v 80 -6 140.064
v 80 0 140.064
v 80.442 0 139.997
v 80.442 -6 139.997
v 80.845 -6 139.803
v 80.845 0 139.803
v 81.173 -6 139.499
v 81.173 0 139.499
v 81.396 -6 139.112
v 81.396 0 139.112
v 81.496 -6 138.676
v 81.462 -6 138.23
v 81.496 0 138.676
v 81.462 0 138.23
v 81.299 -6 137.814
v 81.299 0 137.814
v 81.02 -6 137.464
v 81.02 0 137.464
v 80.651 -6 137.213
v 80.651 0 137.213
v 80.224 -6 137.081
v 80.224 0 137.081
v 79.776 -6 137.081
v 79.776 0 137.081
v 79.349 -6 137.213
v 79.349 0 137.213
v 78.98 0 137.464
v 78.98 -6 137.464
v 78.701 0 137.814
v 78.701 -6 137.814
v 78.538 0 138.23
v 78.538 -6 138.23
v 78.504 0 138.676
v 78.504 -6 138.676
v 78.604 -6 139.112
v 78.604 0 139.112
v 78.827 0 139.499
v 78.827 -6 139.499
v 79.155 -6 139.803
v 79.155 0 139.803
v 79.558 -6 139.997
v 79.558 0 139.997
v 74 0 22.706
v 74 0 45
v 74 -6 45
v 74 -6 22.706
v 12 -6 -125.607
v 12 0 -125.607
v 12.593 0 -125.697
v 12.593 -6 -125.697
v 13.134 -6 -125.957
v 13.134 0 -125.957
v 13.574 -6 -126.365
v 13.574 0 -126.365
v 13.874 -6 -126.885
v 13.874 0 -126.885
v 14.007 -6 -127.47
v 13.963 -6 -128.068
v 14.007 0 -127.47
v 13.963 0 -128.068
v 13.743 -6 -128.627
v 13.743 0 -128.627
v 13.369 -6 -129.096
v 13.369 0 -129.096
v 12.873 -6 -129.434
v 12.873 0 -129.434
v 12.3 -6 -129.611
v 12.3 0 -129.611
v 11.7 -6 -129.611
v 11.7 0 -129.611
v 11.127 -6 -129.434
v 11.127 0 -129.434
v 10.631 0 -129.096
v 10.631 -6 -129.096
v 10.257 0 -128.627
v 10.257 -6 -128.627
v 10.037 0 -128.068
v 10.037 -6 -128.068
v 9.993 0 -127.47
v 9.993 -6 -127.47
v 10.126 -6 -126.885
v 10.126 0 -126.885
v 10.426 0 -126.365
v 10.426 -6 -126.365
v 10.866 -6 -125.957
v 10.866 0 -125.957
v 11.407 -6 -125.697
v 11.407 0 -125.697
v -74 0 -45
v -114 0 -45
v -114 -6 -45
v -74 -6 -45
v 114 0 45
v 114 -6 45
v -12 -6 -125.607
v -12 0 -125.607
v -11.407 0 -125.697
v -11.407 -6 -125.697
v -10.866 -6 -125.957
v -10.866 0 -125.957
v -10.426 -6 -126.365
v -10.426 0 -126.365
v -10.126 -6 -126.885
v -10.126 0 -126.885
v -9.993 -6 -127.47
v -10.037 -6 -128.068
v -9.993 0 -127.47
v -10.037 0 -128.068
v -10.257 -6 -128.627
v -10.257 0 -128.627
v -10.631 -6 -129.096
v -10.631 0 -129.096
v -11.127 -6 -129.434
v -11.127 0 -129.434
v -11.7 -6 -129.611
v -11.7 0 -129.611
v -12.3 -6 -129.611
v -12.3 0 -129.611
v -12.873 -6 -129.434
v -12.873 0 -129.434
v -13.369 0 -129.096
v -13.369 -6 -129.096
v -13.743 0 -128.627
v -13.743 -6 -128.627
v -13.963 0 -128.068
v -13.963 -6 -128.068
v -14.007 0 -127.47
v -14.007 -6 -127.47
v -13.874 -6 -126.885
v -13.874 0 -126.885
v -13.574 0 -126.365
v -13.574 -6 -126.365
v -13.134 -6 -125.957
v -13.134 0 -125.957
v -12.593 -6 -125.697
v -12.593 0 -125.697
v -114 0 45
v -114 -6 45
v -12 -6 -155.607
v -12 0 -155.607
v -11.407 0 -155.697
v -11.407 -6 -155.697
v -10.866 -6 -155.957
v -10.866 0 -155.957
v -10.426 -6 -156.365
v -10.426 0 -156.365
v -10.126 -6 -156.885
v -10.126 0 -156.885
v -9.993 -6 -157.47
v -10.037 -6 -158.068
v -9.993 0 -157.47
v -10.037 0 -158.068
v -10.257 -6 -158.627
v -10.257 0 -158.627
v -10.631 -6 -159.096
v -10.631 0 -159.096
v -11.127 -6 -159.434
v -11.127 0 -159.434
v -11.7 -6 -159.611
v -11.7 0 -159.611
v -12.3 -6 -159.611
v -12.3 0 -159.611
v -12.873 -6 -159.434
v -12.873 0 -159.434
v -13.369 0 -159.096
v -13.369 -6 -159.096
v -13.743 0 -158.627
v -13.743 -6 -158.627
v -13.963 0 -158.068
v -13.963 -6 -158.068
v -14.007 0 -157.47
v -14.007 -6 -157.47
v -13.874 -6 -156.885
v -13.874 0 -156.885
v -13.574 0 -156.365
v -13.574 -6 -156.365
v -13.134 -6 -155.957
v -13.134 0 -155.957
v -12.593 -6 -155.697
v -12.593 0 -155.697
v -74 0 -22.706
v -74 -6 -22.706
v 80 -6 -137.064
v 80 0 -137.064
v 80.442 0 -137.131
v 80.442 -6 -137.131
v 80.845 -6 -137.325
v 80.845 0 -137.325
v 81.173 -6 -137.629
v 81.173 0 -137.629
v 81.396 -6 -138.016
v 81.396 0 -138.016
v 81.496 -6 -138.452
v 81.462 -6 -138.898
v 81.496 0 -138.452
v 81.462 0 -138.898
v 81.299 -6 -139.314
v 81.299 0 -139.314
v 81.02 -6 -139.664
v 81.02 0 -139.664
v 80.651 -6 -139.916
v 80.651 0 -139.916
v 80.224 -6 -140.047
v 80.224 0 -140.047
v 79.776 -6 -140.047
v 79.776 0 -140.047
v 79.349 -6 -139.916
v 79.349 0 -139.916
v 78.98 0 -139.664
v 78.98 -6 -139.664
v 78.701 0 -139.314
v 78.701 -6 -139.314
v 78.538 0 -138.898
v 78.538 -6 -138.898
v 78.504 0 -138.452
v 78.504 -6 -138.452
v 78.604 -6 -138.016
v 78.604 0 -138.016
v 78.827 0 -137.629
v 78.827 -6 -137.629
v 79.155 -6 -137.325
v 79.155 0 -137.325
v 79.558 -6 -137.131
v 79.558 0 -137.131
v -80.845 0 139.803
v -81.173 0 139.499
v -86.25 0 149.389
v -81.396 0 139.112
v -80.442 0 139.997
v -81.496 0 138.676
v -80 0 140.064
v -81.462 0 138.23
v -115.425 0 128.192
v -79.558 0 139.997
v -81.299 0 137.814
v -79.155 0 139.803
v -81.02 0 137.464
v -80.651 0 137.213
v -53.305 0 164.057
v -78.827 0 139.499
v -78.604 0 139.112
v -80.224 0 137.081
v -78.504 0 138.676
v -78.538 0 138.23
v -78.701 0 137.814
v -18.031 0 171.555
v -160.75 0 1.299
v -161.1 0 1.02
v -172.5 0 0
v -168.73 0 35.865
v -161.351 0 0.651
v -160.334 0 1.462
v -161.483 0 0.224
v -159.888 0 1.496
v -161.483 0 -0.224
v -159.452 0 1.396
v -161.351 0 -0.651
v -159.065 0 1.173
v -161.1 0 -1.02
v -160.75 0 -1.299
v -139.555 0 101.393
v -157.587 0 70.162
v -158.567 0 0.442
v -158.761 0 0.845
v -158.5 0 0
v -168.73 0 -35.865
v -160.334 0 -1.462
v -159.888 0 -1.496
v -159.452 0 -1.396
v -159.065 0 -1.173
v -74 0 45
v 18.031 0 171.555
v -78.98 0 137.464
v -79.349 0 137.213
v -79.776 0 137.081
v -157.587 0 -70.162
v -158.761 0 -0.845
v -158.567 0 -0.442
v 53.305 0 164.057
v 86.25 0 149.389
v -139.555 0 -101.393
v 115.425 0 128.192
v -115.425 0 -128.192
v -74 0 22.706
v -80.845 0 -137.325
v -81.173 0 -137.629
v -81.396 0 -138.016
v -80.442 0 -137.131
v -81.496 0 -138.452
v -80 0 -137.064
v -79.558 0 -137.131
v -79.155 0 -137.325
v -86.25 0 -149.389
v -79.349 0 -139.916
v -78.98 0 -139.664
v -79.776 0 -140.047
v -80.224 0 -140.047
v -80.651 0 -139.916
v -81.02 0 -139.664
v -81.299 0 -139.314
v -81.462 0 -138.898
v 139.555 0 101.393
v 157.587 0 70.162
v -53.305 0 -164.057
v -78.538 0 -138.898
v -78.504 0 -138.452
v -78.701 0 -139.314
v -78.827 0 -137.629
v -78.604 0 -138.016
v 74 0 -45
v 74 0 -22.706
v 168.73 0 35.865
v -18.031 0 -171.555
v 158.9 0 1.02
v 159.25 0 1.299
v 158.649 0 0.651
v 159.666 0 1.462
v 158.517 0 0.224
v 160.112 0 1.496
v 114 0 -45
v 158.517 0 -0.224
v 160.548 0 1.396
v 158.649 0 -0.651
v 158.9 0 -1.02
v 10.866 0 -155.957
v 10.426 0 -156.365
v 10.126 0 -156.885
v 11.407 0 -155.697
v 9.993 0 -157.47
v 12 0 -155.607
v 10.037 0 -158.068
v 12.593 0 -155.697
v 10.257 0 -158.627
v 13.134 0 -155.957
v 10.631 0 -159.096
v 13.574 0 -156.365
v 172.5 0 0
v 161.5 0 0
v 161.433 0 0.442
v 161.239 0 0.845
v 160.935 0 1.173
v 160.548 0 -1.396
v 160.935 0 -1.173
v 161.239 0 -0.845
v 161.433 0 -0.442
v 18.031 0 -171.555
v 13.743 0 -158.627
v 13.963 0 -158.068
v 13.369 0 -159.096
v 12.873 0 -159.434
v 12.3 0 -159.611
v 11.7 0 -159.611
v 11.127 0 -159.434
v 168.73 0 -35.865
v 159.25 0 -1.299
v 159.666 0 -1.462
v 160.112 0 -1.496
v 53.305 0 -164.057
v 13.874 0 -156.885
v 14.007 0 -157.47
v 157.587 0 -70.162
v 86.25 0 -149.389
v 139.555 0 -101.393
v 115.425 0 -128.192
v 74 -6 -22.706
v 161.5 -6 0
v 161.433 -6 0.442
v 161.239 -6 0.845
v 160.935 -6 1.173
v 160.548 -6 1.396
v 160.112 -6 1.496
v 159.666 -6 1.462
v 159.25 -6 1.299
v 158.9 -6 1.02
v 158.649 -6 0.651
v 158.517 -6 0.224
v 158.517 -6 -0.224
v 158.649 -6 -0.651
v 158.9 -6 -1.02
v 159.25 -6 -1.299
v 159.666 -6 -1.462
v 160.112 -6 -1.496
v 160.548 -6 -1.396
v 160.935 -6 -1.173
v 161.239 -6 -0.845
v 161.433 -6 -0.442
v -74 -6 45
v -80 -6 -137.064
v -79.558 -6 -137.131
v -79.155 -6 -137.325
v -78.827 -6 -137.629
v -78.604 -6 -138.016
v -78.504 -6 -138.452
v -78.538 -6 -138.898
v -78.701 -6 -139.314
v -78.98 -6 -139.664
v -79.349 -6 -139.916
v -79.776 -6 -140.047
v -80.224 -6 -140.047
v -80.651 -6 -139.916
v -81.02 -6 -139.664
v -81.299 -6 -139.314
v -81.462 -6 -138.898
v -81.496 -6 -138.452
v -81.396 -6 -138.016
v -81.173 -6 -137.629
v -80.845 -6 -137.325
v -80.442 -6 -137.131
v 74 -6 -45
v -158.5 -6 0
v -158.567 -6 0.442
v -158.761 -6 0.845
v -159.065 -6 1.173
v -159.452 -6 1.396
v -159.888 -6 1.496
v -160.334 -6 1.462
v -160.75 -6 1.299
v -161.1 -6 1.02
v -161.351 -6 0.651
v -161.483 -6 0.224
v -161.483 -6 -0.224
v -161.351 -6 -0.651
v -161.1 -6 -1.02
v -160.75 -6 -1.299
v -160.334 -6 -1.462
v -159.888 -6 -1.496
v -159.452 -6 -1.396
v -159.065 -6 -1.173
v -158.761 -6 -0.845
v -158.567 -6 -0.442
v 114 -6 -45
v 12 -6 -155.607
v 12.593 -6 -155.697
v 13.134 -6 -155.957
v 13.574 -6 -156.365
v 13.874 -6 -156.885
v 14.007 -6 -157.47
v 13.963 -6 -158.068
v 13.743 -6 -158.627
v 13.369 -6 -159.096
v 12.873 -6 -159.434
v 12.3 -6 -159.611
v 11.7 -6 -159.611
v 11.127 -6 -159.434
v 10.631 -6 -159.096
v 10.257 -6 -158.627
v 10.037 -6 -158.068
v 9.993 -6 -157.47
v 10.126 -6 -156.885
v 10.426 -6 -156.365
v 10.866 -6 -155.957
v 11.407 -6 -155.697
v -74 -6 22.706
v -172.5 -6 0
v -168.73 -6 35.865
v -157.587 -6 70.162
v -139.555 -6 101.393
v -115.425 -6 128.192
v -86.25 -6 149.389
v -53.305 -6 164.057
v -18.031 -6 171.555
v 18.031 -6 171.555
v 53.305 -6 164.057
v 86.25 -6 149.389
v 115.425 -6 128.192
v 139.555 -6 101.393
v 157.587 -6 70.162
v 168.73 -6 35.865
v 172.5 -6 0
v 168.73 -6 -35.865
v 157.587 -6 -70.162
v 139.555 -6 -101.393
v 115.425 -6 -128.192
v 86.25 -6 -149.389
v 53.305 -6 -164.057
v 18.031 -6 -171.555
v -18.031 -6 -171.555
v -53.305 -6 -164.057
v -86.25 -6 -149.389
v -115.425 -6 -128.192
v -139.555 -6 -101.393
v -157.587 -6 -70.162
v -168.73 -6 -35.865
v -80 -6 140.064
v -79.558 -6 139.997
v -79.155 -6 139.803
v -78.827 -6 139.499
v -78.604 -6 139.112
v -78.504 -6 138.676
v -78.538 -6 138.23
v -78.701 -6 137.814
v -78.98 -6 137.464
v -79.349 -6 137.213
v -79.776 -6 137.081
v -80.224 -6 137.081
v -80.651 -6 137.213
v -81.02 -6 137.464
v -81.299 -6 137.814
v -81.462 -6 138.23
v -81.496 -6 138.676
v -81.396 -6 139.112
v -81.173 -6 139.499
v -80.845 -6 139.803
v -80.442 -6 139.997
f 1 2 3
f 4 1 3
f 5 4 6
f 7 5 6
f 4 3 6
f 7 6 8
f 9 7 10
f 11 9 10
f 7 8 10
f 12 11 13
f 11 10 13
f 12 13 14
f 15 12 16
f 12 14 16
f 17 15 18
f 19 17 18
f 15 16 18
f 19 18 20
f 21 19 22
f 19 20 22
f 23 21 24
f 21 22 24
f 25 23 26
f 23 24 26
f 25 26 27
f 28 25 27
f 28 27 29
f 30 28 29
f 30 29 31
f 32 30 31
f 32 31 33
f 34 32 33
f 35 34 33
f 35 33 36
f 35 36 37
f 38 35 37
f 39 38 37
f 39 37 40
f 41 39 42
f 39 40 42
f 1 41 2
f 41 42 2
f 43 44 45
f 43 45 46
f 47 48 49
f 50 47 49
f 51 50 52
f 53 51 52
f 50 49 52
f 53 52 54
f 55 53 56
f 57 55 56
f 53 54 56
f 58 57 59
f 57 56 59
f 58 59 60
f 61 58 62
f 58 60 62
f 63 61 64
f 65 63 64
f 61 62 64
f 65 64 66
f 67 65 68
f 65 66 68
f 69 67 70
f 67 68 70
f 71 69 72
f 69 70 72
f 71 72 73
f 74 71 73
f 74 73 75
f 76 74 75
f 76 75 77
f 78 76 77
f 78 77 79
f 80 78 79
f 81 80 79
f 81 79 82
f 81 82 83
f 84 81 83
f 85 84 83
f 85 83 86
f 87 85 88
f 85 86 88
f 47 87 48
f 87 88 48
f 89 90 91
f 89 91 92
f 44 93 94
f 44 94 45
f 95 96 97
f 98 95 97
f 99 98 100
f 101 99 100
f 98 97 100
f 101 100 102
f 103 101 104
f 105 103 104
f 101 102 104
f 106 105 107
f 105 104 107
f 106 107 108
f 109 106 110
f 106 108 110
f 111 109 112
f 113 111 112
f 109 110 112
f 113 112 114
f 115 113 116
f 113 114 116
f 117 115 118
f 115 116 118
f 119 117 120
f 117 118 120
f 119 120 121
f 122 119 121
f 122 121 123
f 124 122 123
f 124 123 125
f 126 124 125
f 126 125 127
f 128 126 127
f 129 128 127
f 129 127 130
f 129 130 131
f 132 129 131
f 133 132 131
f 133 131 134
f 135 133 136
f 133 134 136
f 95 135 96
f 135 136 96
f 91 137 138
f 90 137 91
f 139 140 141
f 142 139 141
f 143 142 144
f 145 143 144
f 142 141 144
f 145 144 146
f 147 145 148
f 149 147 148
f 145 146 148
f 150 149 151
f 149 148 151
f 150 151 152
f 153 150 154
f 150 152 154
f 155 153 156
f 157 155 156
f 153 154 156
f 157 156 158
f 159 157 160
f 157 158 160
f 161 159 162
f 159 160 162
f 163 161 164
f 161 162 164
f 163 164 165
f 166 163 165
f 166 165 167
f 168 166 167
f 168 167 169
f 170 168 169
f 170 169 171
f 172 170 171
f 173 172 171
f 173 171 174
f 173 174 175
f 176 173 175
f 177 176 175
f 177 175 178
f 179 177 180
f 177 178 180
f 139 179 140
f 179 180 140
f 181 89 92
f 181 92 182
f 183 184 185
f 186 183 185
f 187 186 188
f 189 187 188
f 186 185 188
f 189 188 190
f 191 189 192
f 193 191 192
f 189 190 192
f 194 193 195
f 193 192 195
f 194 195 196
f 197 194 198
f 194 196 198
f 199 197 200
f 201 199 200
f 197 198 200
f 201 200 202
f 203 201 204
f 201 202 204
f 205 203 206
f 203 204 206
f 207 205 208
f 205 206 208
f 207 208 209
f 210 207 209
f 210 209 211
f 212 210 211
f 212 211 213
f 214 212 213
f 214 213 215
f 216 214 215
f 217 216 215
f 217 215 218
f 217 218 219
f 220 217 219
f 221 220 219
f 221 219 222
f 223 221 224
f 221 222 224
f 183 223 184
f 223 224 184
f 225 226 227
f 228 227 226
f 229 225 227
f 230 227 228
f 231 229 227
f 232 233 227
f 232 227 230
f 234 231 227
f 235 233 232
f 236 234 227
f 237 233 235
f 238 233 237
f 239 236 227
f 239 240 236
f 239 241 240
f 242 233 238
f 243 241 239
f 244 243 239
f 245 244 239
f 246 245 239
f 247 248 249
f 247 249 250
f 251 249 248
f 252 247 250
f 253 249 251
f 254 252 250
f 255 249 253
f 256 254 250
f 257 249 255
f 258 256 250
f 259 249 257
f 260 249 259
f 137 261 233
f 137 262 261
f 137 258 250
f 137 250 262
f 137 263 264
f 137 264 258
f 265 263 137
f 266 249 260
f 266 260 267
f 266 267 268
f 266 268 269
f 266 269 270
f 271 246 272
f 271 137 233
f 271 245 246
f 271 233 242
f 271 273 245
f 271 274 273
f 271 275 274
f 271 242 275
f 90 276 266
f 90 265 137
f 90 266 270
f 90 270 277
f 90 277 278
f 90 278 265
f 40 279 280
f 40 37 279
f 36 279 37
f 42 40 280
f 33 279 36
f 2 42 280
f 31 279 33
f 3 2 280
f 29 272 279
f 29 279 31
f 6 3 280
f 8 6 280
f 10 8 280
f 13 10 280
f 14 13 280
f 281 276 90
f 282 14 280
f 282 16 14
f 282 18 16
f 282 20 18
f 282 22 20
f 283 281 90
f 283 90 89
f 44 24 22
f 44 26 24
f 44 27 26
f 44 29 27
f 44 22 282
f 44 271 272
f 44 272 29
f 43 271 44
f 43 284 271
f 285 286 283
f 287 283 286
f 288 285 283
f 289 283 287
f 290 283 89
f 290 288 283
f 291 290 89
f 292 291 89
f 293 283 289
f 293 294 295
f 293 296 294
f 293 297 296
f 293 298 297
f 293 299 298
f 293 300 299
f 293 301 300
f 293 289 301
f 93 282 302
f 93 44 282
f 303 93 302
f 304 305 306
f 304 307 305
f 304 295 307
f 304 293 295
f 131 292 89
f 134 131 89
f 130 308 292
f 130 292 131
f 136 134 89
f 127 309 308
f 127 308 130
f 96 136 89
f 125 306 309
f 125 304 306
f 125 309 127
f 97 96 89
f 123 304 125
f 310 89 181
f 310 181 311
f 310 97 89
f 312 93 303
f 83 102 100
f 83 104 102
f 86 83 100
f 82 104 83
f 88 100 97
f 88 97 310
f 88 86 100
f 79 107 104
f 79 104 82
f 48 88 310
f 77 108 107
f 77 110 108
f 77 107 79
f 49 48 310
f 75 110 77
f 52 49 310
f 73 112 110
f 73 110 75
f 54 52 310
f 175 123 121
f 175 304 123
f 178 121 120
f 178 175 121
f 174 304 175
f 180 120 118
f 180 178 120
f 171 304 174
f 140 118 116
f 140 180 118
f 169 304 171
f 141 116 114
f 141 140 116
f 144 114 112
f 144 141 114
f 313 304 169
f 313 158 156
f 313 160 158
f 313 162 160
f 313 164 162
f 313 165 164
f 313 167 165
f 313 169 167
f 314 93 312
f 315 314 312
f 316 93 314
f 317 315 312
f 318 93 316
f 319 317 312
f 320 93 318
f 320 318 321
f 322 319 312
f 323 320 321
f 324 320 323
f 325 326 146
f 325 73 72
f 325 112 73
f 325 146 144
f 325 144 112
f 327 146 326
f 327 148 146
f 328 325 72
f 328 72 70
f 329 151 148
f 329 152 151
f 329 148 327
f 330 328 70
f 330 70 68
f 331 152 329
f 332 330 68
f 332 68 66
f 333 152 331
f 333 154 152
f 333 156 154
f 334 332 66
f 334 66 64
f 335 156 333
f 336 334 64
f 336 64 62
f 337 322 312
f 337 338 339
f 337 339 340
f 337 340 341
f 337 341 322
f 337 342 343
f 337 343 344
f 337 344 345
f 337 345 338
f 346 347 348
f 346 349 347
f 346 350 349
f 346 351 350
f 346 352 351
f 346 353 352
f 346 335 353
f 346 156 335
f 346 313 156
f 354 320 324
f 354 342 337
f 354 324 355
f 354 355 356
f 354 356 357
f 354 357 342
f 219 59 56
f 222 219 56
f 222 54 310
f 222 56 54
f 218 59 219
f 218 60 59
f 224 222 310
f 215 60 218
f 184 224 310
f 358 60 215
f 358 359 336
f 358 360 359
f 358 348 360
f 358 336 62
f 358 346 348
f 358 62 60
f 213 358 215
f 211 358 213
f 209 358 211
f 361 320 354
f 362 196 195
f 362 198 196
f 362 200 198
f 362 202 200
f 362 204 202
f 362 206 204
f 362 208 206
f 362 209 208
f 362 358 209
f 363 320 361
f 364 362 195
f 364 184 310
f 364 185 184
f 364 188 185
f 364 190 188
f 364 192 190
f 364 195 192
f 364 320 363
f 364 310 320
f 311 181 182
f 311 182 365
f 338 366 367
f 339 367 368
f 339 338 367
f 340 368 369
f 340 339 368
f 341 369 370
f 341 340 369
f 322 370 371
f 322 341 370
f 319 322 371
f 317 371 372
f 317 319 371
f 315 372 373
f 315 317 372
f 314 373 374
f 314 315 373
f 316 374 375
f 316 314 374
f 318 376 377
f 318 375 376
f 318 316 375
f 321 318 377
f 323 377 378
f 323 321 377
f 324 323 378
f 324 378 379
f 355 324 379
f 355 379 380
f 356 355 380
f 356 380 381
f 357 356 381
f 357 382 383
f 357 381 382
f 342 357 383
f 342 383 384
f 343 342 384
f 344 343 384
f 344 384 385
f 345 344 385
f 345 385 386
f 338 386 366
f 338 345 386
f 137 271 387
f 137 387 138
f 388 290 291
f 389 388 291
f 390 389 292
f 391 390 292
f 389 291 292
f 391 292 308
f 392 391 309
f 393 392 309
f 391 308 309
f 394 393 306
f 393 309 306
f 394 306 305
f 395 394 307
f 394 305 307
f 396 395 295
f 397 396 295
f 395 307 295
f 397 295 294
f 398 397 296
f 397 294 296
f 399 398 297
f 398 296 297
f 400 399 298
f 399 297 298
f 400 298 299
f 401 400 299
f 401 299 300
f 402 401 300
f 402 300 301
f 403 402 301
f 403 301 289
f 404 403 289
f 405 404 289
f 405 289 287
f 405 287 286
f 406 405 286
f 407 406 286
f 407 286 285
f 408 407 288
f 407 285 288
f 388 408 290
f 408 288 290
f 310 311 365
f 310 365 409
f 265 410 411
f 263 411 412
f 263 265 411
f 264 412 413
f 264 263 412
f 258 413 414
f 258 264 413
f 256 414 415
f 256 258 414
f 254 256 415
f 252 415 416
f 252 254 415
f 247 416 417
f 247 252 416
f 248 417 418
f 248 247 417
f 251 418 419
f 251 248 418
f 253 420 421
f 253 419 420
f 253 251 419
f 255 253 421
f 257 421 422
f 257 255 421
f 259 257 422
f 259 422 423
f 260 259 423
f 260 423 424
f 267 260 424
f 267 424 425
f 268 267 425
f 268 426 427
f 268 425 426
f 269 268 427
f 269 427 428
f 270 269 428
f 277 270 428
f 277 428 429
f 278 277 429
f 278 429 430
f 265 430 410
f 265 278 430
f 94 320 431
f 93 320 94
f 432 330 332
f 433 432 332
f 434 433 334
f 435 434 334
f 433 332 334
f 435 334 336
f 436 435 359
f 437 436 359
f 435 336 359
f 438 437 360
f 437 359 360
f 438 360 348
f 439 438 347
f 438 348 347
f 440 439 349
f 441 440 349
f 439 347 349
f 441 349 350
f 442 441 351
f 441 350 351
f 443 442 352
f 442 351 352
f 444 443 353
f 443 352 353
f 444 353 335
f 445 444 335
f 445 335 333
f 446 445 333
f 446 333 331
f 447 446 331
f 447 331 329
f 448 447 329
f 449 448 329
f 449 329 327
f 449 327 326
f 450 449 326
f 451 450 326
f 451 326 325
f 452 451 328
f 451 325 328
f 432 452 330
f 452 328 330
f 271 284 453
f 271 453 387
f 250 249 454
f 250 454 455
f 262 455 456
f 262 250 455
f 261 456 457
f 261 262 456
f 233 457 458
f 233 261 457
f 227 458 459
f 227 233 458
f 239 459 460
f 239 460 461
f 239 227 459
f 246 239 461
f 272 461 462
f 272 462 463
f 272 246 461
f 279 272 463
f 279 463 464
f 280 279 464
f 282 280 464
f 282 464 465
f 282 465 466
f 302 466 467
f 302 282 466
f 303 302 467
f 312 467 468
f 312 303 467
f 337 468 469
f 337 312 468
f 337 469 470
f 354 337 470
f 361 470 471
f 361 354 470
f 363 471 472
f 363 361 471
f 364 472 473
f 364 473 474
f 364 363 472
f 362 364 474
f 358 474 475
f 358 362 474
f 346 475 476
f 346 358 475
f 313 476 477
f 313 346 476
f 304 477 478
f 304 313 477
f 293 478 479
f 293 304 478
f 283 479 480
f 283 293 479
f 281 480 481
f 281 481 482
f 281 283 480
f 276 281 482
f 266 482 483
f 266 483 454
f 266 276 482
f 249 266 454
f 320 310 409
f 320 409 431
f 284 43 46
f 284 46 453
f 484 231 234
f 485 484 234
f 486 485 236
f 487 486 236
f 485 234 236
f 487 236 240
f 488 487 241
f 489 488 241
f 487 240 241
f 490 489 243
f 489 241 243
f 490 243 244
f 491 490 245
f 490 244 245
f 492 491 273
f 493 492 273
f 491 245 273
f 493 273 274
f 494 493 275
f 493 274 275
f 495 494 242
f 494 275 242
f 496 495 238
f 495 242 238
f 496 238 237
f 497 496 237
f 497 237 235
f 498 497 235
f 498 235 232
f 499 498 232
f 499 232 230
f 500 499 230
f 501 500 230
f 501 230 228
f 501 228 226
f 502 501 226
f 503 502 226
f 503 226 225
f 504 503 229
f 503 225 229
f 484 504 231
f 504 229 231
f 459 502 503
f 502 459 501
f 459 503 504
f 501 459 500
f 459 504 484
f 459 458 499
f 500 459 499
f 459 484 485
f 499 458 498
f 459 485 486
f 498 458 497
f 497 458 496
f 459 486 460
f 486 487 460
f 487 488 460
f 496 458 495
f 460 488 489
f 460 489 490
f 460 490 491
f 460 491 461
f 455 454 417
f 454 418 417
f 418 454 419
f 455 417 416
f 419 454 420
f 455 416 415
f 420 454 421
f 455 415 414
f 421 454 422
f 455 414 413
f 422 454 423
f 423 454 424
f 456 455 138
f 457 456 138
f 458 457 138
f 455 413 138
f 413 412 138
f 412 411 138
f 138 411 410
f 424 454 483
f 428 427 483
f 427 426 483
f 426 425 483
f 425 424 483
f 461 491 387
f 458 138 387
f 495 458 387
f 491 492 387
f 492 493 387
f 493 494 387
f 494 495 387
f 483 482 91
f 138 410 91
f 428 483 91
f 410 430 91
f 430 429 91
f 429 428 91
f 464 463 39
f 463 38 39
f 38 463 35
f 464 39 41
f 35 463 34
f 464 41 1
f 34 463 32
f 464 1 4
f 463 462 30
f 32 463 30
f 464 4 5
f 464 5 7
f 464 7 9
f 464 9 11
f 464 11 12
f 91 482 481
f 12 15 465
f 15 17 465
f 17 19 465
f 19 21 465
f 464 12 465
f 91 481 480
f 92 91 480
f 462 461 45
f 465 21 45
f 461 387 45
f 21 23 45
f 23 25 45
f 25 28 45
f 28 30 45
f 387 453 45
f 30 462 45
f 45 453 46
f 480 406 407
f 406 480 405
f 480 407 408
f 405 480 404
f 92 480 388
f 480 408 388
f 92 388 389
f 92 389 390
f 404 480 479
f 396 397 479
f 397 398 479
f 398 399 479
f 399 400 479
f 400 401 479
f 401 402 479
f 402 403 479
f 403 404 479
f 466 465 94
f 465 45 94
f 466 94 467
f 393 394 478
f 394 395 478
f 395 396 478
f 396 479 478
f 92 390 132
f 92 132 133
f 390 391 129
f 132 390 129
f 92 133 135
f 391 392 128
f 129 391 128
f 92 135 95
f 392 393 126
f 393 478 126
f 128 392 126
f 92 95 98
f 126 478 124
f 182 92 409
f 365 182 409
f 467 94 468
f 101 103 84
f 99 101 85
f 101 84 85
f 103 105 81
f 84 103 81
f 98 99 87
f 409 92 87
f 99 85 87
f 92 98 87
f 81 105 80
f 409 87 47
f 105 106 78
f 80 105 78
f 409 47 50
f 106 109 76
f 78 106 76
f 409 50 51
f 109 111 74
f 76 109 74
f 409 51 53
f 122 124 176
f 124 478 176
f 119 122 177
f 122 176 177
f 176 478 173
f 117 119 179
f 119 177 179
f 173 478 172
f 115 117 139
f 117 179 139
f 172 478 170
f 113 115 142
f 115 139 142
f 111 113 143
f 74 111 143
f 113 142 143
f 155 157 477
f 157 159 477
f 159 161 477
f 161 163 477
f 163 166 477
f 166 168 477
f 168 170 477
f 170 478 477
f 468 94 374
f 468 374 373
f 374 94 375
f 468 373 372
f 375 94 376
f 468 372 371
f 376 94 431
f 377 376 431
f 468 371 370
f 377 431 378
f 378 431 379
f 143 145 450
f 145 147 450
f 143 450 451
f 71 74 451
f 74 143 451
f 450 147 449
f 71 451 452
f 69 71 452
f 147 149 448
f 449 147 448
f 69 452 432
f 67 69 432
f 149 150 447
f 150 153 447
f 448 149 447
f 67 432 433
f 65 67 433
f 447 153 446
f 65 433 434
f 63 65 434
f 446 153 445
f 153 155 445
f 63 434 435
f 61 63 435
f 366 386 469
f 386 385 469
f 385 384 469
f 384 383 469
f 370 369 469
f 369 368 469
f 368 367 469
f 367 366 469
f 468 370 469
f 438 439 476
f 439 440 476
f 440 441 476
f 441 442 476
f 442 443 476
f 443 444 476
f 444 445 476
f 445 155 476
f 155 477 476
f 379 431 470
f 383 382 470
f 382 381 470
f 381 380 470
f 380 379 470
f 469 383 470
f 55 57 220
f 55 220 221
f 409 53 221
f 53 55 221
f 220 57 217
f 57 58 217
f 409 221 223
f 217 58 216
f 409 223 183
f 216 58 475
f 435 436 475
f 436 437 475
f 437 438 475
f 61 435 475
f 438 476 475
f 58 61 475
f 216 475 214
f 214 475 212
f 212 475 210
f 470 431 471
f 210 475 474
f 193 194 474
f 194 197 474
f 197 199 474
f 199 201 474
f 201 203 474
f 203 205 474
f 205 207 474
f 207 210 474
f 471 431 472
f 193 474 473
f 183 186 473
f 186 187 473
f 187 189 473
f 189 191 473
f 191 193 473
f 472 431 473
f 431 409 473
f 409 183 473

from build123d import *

# Parameters (mm, degrees)
SKETCH_1_R      = 2.013000515
SKETCH_1_R_2    = 1.5
EXTRUDE_2_DEPTH = 6


with BuildPart() as part:
    # 草图1 → 凸台-拉伸2 (new body)
    # profile 1 of 2: a face of its own
    with BuildSketch(Plane(origin=(0, 0, 0), x_dir=(1, 0, 0), z_dir=(0, 1, 0))):
        with BuildLine():
            ThreePointArc((158.5, 0), (160, 1.5), (161.5, 0))
            Line((161.5, 0), (172.5, 0))
            ThreePointArc((172.5, 0), (0, 172.5), (-172.5, 0))
            Line((-172.5, 0), (-161.5, 0))
            ThreePointArc((-161.5, 0), (-160, 1.5), (-158.5, 0))
            Line((-158.5, 0), (-114, 0))
            Line((-114, 0), (-114, 45))
            Line((-114, 45), (-74, 45))
            Line((-74, 45), (-74, 22.705919103))
            Line((-74, 22.705919103), (74, 22.705919103))
            Line((74, 22.705919103), (74, 45))
            Line((74, 45), (114, 45))
            Line((114, 45), (114, 0))
            Line((114, 0), (158.5, 0))
        make_face()
        with Locations(Location((-12, 127.620399327, 0), (0, 0, 270))):
            Circle(SKETCH_1_R, mode=Mode.SUBTRACT)
        with Locations(Location((-80, 138.564064606, 0), (0, 0, 270))):
            Circle(SKETCH_1_R_2, mode=Mode.SUBTRACT)
        with Locations(Location((-12, 157.620399327, 0), (0, 0, 270))):
            Circle(SKETCH_1_R, mode=Mode.SUBTRACT)
        with Locations(Location((12, 127.620399327, 0), (0, 0, 270))):
            Circle(SKETCH_1_R, mode=Mode.SUBTRACT)
        with Locations(Location((12, 157.620399327, 0), (0, 0, 270))):
            Circle(SKETCH_1_R, mode=Mode.SUBTRACT)
        with Locations(Location((80, 138.564064606, 0), (0, 0, 270))):
            Circle(SKETCH_1_R_2, mode=Mode.SUBTRACT)
    # profile 2 of 2: a face of its own
    with BuildSketch(Plane(origin=(0, 0, 0), x_dir=(1, 0, 0), z_dir=(0, 1, 0))):
        with BuildLine():
            Line((172.5, 0), (161.5, 0))
            ThreePointArc((161.5, 0), (160, -1.5), (158.5, 0))
            Line((158.5, 0), (114, 0))
            Line((114, 0), (114, -45))
            Line((114, -45), (74, -45))
            Line((74, -45), (74, -22.705919103))
            Line((74, -22.705919103), (-74, -22.705919103))
            Line((-74, -22.705919103), (-74, -45))
            Line((-74, -45), (-114, -45))
            Line((-114, -45), (-114, 0))
            Line((-114, 0), (-158.5, 0))
            ThreePointArc((-158.5, 0), (-160, -1.5), (-161.5, 0))
            Line((-161.5, 0), (-172.5, 0))
            ThreePointArc((-172.5, 0), (0, -172.5), (172.5, 0))
        make_face()
        with Locations(Location((-80, -138.564064606, 0), (0, 0, 270))):
            Circle(SKETCH_1_R_2, mode=Mode.SUBTRACT)
        with Locations(Location((80, -138.564064606, 0), (0, 0, 270))):
            Circle(SKETCH_1_R_2, mode=Mode.SUBTRACT)
    extrude(amount=-EXTRUDE_2_DEPTH)


solid = part.part
